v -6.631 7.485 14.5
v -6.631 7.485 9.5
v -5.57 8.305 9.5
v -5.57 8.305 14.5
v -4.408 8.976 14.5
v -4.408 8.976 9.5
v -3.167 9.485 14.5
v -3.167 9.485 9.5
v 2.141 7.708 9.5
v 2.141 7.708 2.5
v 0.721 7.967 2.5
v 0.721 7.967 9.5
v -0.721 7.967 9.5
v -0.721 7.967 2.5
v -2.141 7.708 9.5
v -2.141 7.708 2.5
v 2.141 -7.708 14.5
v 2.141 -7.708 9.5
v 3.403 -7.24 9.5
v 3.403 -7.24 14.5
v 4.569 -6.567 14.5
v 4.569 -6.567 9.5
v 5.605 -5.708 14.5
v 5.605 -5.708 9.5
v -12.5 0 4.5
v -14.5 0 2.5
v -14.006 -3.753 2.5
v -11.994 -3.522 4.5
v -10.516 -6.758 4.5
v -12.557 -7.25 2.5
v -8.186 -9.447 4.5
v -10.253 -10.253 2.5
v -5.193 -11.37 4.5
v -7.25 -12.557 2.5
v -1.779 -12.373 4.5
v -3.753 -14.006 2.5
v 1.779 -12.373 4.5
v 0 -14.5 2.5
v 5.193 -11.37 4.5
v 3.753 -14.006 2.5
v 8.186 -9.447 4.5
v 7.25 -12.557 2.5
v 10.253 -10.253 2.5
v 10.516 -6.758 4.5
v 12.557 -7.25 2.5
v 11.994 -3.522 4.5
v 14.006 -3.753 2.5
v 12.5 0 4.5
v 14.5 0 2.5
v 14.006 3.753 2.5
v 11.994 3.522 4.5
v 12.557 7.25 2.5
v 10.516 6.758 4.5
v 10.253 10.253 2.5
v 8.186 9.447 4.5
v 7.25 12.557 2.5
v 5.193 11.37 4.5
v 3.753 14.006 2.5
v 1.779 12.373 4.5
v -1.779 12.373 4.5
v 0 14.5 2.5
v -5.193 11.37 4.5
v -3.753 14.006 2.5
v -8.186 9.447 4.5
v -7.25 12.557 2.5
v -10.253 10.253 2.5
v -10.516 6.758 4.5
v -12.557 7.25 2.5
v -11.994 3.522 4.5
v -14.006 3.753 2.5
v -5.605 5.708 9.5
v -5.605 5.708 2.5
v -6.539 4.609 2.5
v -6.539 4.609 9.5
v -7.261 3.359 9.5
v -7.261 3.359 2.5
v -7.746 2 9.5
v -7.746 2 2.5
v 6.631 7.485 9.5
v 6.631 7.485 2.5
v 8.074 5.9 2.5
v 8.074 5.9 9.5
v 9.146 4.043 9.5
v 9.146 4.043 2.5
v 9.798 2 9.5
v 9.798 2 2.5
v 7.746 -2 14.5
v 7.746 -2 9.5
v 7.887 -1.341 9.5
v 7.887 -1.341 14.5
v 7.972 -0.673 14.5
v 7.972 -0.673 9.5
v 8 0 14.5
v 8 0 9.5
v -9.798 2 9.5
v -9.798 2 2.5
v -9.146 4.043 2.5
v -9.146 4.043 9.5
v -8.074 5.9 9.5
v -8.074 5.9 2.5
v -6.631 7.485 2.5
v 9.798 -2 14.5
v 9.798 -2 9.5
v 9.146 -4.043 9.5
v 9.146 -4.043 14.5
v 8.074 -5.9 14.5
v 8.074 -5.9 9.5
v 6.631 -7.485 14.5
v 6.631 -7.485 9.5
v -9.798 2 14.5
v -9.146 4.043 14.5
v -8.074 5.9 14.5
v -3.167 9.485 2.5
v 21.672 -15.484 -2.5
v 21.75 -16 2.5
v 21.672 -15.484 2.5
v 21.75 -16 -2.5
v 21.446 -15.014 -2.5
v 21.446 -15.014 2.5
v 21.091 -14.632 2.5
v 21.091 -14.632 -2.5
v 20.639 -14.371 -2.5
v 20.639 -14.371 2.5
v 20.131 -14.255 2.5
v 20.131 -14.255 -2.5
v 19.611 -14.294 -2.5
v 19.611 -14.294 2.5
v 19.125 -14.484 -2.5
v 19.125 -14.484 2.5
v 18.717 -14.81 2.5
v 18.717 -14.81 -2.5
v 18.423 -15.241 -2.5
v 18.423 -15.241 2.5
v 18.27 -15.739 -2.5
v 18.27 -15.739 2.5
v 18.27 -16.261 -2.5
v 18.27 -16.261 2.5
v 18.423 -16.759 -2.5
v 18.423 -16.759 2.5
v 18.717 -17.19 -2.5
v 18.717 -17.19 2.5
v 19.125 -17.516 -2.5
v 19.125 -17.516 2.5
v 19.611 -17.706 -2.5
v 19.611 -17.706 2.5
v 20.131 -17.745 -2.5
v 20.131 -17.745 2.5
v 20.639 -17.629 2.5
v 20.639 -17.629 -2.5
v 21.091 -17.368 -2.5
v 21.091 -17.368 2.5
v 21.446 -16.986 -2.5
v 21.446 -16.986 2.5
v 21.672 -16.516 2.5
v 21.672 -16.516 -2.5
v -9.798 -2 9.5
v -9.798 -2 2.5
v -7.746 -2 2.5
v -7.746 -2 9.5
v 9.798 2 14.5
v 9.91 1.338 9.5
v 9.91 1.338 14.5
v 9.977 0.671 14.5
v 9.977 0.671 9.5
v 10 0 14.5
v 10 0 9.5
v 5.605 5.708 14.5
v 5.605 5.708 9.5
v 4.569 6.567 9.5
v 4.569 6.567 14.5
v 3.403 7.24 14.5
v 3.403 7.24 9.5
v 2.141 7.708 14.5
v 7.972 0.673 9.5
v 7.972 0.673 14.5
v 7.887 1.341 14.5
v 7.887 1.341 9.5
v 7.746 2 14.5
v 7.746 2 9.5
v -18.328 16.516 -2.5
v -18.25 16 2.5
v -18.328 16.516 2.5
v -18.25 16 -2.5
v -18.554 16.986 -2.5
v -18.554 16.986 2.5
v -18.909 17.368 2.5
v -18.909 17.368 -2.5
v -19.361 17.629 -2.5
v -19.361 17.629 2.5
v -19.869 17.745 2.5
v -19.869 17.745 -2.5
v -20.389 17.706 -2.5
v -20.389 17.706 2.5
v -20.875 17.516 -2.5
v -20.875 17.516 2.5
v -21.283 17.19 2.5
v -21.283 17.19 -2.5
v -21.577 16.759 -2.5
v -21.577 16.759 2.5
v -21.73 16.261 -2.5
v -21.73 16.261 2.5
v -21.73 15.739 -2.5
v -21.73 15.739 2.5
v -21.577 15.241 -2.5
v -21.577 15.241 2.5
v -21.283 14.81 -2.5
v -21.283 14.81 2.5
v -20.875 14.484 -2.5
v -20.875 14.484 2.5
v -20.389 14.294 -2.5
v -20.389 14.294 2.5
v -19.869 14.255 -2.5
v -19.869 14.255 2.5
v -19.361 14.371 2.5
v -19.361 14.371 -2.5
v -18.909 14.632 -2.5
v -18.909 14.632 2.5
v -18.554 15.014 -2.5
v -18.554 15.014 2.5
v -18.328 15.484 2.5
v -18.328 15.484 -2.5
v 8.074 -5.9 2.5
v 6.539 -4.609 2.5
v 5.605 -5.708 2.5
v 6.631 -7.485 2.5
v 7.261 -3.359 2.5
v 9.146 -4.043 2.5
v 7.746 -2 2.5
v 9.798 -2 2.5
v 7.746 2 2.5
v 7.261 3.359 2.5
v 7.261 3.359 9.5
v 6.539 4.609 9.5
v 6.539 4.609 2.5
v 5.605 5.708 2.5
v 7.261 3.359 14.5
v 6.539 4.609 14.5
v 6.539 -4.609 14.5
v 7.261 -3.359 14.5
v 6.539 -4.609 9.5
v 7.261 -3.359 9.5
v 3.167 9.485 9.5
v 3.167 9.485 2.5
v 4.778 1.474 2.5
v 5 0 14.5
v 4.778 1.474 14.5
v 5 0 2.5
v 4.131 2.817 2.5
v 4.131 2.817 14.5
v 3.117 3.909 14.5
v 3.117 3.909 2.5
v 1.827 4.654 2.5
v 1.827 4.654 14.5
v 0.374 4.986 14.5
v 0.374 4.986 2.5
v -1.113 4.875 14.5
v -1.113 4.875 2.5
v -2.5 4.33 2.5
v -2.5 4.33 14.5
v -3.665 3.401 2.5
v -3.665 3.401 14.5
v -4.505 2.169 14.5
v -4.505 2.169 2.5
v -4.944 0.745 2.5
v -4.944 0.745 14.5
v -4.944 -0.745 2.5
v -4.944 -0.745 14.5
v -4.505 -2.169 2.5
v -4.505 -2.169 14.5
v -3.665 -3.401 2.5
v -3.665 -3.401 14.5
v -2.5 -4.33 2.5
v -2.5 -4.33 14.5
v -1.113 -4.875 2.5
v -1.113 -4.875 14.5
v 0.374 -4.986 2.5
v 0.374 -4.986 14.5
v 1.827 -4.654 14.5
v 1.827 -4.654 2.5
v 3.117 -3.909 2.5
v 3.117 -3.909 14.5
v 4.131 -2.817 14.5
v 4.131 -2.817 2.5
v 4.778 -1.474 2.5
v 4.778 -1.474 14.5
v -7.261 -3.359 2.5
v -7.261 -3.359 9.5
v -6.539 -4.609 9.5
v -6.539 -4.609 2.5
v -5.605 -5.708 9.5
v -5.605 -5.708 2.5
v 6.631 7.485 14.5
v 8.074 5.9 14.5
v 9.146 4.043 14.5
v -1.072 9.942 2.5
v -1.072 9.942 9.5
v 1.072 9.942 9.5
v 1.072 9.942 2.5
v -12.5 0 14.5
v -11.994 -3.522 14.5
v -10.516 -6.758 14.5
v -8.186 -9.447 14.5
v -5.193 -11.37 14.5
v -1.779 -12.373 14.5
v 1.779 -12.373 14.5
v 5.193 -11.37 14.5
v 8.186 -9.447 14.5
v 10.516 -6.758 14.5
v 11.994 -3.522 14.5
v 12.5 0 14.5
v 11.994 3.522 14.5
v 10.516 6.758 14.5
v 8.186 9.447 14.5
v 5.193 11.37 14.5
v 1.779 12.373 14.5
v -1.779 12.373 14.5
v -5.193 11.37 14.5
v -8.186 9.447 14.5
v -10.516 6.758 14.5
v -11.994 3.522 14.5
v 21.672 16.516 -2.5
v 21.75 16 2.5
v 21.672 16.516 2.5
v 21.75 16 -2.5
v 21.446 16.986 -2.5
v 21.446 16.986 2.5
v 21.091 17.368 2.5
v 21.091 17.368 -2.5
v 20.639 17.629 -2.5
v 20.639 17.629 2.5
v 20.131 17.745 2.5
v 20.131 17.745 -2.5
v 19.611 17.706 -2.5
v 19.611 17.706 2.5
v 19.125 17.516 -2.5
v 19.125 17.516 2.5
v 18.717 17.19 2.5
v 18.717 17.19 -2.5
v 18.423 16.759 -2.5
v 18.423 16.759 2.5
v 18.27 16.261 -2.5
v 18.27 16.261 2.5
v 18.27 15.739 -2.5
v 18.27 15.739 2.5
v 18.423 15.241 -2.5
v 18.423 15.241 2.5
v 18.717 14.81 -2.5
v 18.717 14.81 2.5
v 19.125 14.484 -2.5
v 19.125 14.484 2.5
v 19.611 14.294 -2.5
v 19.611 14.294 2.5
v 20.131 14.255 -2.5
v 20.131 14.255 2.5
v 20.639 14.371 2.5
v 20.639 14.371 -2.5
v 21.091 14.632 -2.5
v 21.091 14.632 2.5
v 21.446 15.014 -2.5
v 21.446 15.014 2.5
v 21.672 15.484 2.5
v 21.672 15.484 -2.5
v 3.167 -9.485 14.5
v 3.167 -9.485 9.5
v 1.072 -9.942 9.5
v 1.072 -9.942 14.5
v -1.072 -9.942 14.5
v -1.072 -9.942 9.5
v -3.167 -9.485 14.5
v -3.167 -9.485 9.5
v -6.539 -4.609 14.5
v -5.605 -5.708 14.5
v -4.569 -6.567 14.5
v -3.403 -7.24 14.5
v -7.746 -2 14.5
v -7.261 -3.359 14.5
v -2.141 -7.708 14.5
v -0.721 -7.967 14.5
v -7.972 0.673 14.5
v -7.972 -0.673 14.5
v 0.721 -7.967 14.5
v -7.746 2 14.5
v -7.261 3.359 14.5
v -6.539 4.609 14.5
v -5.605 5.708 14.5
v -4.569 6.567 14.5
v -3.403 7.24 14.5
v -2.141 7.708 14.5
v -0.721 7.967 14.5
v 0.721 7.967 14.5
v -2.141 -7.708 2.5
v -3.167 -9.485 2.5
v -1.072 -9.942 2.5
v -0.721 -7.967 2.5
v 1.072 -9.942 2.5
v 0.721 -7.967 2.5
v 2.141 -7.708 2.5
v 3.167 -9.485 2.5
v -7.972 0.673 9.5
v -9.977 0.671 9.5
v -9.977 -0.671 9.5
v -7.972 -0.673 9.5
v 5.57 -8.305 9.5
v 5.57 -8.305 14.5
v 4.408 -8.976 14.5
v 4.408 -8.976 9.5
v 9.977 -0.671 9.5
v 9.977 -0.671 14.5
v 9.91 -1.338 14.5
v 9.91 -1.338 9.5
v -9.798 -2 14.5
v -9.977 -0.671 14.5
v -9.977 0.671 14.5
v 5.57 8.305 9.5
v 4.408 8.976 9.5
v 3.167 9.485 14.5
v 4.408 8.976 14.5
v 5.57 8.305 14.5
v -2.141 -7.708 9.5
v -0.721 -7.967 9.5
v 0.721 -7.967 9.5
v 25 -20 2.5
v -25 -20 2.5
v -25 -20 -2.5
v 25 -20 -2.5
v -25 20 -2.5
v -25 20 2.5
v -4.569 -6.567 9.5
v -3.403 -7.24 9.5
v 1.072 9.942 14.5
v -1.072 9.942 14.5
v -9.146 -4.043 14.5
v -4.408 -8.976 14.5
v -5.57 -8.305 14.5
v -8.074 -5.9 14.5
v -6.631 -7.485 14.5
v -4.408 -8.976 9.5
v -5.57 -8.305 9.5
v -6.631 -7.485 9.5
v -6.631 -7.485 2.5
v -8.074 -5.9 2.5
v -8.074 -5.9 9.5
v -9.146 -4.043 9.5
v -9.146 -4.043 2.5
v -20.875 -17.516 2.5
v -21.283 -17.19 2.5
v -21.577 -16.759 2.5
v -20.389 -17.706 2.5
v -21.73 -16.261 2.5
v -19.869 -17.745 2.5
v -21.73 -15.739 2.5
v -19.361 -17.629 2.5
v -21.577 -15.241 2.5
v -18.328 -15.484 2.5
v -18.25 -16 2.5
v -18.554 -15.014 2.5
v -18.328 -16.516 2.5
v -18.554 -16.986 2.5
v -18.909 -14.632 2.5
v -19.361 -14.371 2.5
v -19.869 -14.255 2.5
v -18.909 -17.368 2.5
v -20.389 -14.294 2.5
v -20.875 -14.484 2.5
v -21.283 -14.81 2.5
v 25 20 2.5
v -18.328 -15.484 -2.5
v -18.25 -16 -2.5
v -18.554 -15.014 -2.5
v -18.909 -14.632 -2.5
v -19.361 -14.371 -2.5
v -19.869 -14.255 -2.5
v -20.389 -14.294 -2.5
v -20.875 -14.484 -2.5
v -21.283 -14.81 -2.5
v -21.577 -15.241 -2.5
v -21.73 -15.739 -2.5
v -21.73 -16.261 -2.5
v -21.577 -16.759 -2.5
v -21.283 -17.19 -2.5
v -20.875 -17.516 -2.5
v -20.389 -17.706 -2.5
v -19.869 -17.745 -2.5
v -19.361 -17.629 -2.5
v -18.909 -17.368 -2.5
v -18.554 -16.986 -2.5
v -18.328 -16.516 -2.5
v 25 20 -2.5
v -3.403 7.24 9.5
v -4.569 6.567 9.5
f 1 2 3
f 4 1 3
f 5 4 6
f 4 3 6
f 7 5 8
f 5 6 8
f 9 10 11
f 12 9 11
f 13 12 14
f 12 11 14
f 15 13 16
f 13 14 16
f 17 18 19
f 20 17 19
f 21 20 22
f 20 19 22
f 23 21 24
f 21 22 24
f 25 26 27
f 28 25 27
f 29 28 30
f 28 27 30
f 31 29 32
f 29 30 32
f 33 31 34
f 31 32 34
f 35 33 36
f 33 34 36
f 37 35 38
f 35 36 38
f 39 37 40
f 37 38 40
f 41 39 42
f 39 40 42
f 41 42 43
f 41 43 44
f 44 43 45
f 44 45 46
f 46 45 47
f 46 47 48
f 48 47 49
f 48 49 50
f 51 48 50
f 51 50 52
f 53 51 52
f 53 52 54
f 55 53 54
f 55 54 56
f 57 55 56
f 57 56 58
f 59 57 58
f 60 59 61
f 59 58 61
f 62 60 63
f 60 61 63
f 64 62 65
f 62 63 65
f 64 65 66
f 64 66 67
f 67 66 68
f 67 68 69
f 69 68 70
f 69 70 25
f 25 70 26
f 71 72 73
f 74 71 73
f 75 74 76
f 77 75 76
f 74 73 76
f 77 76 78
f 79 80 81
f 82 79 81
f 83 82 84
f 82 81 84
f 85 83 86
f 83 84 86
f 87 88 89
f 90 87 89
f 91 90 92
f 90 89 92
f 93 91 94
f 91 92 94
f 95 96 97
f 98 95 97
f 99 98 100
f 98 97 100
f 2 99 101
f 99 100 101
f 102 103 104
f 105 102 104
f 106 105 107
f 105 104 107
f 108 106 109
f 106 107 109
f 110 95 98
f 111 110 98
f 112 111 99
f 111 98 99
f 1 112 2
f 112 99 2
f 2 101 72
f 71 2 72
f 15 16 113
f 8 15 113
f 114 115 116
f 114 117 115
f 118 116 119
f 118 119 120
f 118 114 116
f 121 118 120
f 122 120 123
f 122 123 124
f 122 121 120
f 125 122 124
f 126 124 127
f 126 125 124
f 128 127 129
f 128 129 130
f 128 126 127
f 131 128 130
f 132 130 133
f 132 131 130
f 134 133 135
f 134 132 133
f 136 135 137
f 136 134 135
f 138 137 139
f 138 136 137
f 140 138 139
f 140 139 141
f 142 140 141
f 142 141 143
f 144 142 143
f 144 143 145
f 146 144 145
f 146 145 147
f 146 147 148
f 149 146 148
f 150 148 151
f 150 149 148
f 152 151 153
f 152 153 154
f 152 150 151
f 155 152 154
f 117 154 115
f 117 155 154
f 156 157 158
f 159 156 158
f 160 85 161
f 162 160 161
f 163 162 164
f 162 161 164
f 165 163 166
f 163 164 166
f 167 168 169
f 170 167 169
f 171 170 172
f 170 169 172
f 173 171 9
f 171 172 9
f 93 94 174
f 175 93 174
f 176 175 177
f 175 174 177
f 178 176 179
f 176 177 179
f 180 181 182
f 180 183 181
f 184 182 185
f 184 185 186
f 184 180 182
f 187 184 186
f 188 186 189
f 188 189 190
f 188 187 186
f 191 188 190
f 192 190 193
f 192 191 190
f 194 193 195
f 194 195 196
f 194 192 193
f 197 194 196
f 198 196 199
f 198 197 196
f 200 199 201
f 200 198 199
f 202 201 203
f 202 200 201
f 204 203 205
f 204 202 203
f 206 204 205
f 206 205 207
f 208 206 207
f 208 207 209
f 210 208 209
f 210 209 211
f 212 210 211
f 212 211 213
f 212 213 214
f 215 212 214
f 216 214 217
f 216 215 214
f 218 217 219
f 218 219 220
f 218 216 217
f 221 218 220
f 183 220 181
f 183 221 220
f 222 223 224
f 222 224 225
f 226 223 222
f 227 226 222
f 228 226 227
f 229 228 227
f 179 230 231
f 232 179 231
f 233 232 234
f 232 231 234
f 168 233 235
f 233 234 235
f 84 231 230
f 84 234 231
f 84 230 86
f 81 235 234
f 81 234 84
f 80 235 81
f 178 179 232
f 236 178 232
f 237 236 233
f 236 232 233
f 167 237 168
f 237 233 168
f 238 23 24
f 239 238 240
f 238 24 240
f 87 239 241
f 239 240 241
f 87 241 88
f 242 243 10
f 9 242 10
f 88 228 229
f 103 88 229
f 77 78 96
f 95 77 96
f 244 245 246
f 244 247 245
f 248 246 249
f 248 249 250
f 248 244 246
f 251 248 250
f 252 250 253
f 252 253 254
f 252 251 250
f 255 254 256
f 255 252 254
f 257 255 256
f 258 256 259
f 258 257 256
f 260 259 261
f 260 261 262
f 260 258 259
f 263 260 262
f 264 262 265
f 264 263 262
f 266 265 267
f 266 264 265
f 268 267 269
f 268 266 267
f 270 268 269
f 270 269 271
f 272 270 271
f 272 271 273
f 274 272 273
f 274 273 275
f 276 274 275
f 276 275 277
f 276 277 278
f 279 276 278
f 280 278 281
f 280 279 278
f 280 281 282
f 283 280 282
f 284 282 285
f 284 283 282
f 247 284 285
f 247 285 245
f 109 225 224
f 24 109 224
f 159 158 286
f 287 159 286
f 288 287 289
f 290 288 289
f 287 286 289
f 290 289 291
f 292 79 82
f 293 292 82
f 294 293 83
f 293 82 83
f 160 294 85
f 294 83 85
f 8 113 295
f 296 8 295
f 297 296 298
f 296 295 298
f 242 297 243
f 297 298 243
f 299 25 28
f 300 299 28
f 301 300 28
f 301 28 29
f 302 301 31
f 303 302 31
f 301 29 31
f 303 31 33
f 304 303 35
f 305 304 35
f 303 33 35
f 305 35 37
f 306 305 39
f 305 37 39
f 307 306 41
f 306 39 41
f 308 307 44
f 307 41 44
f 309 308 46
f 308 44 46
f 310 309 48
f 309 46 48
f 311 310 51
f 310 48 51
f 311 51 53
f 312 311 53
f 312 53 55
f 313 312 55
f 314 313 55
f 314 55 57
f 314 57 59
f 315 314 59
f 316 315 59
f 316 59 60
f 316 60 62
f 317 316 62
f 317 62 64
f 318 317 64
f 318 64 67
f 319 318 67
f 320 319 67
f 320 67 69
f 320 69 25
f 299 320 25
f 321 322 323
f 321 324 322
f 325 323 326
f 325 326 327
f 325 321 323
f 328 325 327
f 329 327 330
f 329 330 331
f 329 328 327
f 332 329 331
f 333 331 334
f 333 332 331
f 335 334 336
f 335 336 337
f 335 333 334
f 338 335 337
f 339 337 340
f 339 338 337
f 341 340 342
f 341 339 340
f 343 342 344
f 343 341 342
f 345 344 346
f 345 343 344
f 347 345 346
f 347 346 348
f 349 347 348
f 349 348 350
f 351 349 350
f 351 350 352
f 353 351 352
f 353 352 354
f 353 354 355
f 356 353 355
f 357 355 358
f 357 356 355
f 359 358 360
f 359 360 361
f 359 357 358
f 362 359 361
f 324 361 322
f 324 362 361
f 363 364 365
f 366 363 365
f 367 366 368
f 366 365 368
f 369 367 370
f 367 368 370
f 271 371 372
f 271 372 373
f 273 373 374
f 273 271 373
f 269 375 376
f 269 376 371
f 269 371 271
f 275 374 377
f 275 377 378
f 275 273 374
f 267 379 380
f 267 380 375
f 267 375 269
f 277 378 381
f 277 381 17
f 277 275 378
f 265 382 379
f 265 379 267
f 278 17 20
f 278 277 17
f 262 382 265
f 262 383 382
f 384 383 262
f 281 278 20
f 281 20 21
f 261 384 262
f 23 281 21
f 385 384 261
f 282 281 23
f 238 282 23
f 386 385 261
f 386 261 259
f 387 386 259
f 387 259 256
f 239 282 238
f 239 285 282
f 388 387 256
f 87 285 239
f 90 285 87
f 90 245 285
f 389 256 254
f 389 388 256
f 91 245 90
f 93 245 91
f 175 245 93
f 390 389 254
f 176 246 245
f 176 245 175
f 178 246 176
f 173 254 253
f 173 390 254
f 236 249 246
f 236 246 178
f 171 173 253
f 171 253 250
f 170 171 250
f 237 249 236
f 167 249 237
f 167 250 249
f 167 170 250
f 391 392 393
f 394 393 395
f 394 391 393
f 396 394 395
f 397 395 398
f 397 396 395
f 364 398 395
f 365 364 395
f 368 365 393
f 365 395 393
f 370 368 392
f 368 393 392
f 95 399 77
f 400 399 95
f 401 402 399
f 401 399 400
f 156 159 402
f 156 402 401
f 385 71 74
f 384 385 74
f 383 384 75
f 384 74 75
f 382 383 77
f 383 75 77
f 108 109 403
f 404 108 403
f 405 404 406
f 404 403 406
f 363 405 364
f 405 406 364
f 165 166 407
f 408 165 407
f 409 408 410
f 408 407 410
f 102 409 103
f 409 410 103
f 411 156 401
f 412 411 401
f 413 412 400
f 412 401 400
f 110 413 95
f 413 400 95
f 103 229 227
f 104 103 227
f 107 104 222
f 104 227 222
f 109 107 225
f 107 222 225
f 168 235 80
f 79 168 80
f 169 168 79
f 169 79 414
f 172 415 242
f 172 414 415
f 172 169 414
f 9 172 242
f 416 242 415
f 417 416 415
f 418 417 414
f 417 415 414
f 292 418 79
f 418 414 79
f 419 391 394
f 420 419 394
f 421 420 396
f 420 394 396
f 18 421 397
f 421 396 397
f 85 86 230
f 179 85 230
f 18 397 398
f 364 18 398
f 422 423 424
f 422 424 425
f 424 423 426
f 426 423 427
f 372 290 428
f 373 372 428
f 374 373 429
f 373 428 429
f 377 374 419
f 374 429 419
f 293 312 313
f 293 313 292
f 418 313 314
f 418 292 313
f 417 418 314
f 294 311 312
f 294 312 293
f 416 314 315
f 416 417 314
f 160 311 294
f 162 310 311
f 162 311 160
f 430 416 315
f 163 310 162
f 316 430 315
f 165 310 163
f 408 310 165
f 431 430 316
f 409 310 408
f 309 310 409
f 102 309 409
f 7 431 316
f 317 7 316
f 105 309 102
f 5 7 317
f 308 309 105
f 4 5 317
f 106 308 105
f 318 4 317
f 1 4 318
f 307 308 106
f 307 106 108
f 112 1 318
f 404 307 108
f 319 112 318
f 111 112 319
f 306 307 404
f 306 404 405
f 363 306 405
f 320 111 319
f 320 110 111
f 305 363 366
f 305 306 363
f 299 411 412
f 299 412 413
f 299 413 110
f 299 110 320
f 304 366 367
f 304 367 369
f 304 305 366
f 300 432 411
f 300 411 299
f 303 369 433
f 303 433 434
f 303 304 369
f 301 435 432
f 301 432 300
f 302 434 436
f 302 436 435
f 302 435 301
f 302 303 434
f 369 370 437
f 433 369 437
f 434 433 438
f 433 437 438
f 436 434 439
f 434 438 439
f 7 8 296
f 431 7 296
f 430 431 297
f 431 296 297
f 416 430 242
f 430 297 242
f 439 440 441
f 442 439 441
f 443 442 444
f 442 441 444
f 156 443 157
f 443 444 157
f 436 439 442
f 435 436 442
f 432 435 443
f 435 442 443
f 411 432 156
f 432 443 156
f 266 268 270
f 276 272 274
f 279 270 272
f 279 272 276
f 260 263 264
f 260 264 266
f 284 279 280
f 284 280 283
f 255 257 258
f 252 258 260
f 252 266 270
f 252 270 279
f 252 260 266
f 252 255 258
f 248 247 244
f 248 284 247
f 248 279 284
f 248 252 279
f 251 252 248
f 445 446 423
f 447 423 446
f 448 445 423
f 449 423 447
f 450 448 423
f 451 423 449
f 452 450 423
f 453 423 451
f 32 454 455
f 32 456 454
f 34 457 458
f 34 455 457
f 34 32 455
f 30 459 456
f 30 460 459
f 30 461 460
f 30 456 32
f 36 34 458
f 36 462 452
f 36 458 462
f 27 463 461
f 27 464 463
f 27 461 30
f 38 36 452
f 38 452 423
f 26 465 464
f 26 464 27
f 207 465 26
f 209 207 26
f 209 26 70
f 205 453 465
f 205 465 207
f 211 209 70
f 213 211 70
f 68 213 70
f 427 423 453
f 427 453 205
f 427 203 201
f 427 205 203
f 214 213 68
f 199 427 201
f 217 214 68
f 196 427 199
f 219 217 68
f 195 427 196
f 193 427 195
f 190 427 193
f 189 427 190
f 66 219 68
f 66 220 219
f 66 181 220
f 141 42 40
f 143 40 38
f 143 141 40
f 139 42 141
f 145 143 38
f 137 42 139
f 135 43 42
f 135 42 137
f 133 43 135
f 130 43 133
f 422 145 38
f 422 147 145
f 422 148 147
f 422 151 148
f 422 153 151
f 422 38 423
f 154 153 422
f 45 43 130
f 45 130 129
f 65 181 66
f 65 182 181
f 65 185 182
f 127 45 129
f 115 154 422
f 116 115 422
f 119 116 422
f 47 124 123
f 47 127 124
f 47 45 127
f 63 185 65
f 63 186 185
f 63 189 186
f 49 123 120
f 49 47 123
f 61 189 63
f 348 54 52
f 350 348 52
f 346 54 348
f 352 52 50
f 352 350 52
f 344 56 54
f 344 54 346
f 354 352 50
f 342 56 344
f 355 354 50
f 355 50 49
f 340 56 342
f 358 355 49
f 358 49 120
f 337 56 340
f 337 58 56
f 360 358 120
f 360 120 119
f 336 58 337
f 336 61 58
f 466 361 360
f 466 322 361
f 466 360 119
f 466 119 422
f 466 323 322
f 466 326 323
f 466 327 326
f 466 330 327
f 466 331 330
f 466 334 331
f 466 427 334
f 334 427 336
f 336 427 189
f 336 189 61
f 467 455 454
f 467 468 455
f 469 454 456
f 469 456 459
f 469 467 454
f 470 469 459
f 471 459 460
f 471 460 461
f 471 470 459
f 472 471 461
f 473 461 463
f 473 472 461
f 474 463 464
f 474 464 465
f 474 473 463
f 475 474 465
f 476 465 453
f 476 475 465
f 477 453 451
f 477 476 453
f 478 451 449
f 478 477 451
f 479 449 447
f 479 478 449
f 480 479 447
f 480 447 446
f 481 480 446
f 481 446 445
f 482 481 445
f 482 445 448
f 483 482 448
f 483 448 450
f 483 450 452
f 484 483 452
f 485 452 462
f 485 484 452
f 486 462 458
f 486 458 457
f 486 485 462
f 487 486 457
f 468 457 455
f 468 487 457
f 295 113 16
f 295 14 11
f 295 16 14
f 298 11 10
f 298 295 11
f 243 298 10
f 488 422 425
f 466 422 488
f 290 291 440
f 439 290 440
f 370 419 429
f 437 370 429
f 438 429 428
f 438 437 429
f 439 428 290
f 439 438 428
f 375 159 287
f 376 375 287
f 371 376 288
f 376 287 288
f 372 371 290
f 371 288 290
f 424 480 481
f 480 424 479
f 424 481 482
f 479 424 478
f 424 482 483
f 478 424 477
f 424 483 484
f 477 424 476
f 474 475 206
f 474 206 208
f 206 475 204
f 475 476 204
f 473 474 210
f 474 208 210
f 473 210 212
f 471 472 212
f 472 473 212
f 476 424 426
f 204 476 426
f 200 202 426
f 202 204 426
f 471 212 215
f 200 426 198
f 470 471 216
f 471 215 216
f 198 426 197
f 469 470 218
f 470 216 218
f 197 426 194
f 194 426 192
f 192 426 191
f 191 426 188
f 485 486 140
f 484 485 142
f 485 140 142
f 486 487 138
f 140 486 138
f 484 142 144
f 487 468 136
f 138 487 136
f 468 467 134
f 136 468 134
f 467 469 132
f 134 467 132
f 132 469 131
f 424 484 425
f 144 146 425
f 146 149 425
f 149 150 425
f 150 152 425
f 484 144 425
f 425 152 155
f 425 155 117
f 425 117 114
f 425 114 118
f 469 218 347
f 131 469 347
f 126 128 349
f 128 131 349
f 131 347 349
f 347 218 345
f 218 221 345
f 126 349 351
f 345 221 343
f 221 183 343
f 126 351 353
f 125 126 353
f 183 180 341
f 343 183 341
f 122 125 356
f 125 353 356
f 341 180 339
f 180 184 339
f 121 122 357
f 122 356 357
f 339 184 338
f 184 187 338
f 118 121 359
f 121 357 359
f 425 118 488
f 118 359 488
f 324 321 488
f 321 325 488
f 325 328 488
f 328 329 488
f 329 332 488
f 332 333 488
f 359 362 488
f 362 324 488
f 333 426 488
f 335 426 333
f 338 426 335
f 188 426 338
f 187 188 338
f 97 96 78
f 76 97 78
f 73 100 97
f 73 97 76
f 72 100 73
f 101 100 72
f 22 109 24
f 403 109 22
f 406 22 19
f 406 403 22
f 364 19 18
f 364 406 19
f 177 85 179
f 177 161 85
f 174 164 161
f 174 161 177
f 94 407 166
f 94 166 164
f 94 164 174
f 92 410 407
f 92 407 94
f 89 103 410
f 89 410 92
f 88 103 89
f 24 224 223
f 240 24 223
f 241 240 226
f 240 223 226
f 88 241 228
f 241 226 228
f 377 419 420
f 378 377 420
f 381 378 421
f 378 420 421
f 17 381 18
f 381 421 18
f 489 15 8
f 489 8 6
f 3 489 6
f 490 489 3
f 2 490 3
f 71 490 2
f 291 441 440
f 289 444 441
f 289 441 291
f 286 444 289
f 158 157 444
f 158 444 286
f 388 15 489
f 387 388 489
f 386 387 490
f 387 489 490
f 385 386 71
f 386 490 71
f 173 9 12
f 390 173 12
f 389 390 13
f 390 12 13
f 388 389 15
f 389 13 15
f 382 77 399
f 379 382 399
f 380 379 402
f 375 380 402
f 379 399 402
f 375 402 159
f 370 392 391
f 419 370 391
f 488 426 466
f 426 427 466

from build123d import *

# Parameters (mm, degrees)
CROQUIS1_W              = 50
CROQUIS1_H              = 40
CROQUIS1_R              = 1.75
SALIENTE_EXTRUIR1_DEPTH = 2.5
CROQUIS2_R              = 12.5
CROQUIS2_R_2            = 10
CROQUIS2_R_3            = 8
CROQUIS2_R_4            = 5
SALIENTE_EXTRUIR2_DEPTH = 7
CROQUIS4_R              = 12.5
CROQUIS4_R_2            = 5
SALIENTE_EXTRUIR3_DEPTH = 5
CHAFL_N1_SIZE           = 2


with BuildPart() as part:
    # Croquis1 → Saliente-Extruir1 (new, symmetric)
    with BuildSketch(Plane.XY):
        Rectangle(CROQUIS1_W, CROQUIS1_H)
        with Locations((-20, 16)):
            Circle(CROQUIS1_R, mode=Mode.SUBTRACT)
        with Locations((20, 16)):
            Circle(CROQUIS1_R, mode=Mode.SUBTRACT)
        with Locations((20, -16)):
            Circle(CROQUIS1_R, mode=Mode.SUBTRACT)
        with Locations((-20, -16)):
            Circle(CROQUIS1_R, mode=Mode.SUBTRACT)
    extrude(amount=SALIENTE_EXTRUIR1_DEPTH, both=True)

    # Croquis2 → Saliente-Extruir2 (add)
    with BuildSketch(Plane.XY.offset(2.5)):
        with Locations(Location((0, 0, 0), (0, 0, 180))):
            Circle(CROQUIS2_R)
        Circle(CROQUIS2_R_2, mode=Mode.SUBTRACT)
        with BuildLine():
            ThreePointArc((-9.797958971, 2), (-10, 0), (-9.797958971, -2))
            Line((-9.797958971, -2), (-7.745966692, -2))
            ThreePointArc((-7.745966692, -2), (-8, 0), (-7.745966692, 2))
            Line((-7.745966692, 2), (-9.797958971, 2))
        make_face()
        with BuildLine():
            Line((-5.605034154, -5.708203932), (-6.631030293, -7.485281374))
            ThreePointArc((-6.631030293, -7.485281374), (-5, -8.660254038), (-3.166928678, -9.485281374))
            Line((-3.166928678, -9.485281374), (-2.140932539, -7.708203932))
            ThreePointArc((-2.140932539, -7.708203932), (-4, -6.92820323), (-5.605034154, -5.708203932))
        make_face()
        with BuildLine():
            Line((2.140932539, -7.708203932), (3.166928678, -9.485281374))
            ThreePointArc((3.166928678, -9.485281374), (5, -8.660254038), (6.631030293, -7.485281374))
            Line((6.631030293, -7.485281374), (5.605034154, -5.708203933))
            ThreePointArc((5.605034154, -5.708203933), (4, -6.92820323), (2.140932539, -7.708203932))
        make_face()
        with BuildLine():
            Line((7.745966692, -2), (9.797958971, -2))
            ThreePointArc((9.797958971, -2), (9.94936153, -1.00508962), (10, 0))
            ThreePointArc((10, 0), (9.94936153, 1.00508962), (9.797958971, 2))
            Line((9.797958971, 2), (7.745966692, 2))
            ThreePointArc((7.745966692, 2), (7.93623757, 1.00803434), (8, 0))
            ThreePointArc((8, 0), (7.93623757, -1.00803434), (7.745966692, -2))
        make_face()
        with BuildLine():
            ThreePointArc((6.631030293, 7.485281374), (5, 8.660254038), (3.166928678, 9.485281374))
            Line((3.166928678, 9.485281374), (2.140932539, 7.708203932))
            ThreePointArc((2.140932539, 7.708203932), (4, 6.92820323), (5.605034154, 5.708203932))
            Line((5.605034154, 5.708203932), (6.631030293, 7.485281374))
        make_face()
        with BuildLine():
            ThreePointArc((-3.166928678, 9.485281374), (-5, 8.660254038), (-6.631030293, 7.485281374))
            Line((-6.631030293, 7.485281374), (-5.605034154, 5.708203932))
            ThreePointArc((-5.605034154, 5.708203932), (-4, 6.92820323), (-2.140932539, 7.708203932))
            Line((-2.140932539, 7.708203932), (-3.166928678, 9.485281374))
        make_face()
        Circle(CROQUIS2_R_3)
        Circle(CROQUIS2_R_4, mode=Mode.SUBTRACT)
    extrude(amount=SALIENTE_EXTRUIR2_DEPTH)

    # Croquis4 → Saliente-Extruir3 (add)
    with BuildSketch(Plane.XY.offset(9.5)):
        with Locations(Location((0, 0, 0), (0, 0, 180))):
            Circle(CROQUIS4_R)
        with BuildLine():
            ThreePointArc((9.797958971, 2), (9.94936153, 1.00508962), (10, 0))
            ThreePointArc((10, 0), (9.94936153, -1.00508962), (9.797958971, -2))
            ThreePointArc((9.797958971, -2), (8.660254038, -5), (6.631030293, -7.485281374))
            ThreePointArc((6.631030293, -7.485281374), (5, -8.660254038), (3.166928678, -9.485281374))
            ThreePointArc((3.166928678, -9.485281374), (0, -10), (-3.166928678, -9.485281374))
            ThreePointArc((-3.166928678, -9.485281374), (-5, -8.660254038), (-6.631030293, -7.485281374))
            ThreePointArc((-6.631030293, -7.485281374), (-8.660254038, -5), (-9.797958971, -2))
            ThreePointArc((-9.797958971, -2), (-10, 0), (-9.797958971, 2))
            ThreePointArc((-9.797958971, 2), (-8.660254038, 5), (-6.631030293, 7.485281374))
            ThreePointArc((-6.631030293, 7.485281374), (-5, 8.660254038), (-3.166928678, 9.485281374))
            ThreePointArc((-3.166928678, 9.485281374), (0, 10), (3.166928678, 9.485281374))
            ThreePointArc((3.166928678, 9.485281374), (5, 8.660254038), (6.631030293, 7.485281374))
            ThreePointArc((6.631030293, 7.485281374), (8.660254038, 5), (9.797958971, 2))
        make_face(mode=Mode.SUBTRACT)
        with BuildLine():
            ThreePointArc((7.745966692, -2), (7.93623757, -1.00803434), (8, 0))
            ThreePointArc((8, 0), (7.93623757, 1.00803434), (7.745966692, 2))
            ThreePointArc((7.745966692, 2), (6.92820323, 4), (5.605034154, 5.708203932))
            ThreePointArc((5.605034154, 5.708203932), (4, 6.92820323), (2.140932539, 7.708203932))
            ThreePointArc((2.140932539, 7.708203932), (0, 8), (-2.140932539, 7.708203932))
            ThreePointArc((-2.140932539, 7.708203932), (-4, 6.92820323), (-5.605034154, 5.708203932))
            ThreePointArc((-5.605034154, 5.708203932), (-6.92820323, 4), (-7.745966692, 2))
            ThreePointArc((-7.745966692, 2), (-8, 0), (-7.745966692, -2))
            ThreePointArc((-7.745966692, -2), (-6.92820323, -4), (-5.605034154, -5.708203932))
            ThreePointArc((-5.605034154, -5.708203932), (-4, -6.92820323), (-2.140932539, -7.708203932))
            ThreePointArc((-2.140932539, -7.708203932), (0, -8), (2.140932539, -7.708203932))
            ThreePointArc((2.140932539, -7.708203932), (4, -6.92820323), (5.605034154, -5.708203933))
            ThreePointArc((5.605034154, -5.708203933), (6.92820323, -4), (7.745966692, -2))
        make_face()
        Circle(CROQUIS4_R_2, mode=Mode.SUBTRACT)
    extrude(amount=SALIENTE_EXTRUIR3_DEPTH)

    # Chaflán1
    chafl_n1_edges = [part.edges().sort_by_distance(p)[0] for p in [
        (12.5, 0, 2.5),
    ]]
    chamfer(chafl_n1_edges, length=CHAFL_N1_SIZE)


solid = part.part
